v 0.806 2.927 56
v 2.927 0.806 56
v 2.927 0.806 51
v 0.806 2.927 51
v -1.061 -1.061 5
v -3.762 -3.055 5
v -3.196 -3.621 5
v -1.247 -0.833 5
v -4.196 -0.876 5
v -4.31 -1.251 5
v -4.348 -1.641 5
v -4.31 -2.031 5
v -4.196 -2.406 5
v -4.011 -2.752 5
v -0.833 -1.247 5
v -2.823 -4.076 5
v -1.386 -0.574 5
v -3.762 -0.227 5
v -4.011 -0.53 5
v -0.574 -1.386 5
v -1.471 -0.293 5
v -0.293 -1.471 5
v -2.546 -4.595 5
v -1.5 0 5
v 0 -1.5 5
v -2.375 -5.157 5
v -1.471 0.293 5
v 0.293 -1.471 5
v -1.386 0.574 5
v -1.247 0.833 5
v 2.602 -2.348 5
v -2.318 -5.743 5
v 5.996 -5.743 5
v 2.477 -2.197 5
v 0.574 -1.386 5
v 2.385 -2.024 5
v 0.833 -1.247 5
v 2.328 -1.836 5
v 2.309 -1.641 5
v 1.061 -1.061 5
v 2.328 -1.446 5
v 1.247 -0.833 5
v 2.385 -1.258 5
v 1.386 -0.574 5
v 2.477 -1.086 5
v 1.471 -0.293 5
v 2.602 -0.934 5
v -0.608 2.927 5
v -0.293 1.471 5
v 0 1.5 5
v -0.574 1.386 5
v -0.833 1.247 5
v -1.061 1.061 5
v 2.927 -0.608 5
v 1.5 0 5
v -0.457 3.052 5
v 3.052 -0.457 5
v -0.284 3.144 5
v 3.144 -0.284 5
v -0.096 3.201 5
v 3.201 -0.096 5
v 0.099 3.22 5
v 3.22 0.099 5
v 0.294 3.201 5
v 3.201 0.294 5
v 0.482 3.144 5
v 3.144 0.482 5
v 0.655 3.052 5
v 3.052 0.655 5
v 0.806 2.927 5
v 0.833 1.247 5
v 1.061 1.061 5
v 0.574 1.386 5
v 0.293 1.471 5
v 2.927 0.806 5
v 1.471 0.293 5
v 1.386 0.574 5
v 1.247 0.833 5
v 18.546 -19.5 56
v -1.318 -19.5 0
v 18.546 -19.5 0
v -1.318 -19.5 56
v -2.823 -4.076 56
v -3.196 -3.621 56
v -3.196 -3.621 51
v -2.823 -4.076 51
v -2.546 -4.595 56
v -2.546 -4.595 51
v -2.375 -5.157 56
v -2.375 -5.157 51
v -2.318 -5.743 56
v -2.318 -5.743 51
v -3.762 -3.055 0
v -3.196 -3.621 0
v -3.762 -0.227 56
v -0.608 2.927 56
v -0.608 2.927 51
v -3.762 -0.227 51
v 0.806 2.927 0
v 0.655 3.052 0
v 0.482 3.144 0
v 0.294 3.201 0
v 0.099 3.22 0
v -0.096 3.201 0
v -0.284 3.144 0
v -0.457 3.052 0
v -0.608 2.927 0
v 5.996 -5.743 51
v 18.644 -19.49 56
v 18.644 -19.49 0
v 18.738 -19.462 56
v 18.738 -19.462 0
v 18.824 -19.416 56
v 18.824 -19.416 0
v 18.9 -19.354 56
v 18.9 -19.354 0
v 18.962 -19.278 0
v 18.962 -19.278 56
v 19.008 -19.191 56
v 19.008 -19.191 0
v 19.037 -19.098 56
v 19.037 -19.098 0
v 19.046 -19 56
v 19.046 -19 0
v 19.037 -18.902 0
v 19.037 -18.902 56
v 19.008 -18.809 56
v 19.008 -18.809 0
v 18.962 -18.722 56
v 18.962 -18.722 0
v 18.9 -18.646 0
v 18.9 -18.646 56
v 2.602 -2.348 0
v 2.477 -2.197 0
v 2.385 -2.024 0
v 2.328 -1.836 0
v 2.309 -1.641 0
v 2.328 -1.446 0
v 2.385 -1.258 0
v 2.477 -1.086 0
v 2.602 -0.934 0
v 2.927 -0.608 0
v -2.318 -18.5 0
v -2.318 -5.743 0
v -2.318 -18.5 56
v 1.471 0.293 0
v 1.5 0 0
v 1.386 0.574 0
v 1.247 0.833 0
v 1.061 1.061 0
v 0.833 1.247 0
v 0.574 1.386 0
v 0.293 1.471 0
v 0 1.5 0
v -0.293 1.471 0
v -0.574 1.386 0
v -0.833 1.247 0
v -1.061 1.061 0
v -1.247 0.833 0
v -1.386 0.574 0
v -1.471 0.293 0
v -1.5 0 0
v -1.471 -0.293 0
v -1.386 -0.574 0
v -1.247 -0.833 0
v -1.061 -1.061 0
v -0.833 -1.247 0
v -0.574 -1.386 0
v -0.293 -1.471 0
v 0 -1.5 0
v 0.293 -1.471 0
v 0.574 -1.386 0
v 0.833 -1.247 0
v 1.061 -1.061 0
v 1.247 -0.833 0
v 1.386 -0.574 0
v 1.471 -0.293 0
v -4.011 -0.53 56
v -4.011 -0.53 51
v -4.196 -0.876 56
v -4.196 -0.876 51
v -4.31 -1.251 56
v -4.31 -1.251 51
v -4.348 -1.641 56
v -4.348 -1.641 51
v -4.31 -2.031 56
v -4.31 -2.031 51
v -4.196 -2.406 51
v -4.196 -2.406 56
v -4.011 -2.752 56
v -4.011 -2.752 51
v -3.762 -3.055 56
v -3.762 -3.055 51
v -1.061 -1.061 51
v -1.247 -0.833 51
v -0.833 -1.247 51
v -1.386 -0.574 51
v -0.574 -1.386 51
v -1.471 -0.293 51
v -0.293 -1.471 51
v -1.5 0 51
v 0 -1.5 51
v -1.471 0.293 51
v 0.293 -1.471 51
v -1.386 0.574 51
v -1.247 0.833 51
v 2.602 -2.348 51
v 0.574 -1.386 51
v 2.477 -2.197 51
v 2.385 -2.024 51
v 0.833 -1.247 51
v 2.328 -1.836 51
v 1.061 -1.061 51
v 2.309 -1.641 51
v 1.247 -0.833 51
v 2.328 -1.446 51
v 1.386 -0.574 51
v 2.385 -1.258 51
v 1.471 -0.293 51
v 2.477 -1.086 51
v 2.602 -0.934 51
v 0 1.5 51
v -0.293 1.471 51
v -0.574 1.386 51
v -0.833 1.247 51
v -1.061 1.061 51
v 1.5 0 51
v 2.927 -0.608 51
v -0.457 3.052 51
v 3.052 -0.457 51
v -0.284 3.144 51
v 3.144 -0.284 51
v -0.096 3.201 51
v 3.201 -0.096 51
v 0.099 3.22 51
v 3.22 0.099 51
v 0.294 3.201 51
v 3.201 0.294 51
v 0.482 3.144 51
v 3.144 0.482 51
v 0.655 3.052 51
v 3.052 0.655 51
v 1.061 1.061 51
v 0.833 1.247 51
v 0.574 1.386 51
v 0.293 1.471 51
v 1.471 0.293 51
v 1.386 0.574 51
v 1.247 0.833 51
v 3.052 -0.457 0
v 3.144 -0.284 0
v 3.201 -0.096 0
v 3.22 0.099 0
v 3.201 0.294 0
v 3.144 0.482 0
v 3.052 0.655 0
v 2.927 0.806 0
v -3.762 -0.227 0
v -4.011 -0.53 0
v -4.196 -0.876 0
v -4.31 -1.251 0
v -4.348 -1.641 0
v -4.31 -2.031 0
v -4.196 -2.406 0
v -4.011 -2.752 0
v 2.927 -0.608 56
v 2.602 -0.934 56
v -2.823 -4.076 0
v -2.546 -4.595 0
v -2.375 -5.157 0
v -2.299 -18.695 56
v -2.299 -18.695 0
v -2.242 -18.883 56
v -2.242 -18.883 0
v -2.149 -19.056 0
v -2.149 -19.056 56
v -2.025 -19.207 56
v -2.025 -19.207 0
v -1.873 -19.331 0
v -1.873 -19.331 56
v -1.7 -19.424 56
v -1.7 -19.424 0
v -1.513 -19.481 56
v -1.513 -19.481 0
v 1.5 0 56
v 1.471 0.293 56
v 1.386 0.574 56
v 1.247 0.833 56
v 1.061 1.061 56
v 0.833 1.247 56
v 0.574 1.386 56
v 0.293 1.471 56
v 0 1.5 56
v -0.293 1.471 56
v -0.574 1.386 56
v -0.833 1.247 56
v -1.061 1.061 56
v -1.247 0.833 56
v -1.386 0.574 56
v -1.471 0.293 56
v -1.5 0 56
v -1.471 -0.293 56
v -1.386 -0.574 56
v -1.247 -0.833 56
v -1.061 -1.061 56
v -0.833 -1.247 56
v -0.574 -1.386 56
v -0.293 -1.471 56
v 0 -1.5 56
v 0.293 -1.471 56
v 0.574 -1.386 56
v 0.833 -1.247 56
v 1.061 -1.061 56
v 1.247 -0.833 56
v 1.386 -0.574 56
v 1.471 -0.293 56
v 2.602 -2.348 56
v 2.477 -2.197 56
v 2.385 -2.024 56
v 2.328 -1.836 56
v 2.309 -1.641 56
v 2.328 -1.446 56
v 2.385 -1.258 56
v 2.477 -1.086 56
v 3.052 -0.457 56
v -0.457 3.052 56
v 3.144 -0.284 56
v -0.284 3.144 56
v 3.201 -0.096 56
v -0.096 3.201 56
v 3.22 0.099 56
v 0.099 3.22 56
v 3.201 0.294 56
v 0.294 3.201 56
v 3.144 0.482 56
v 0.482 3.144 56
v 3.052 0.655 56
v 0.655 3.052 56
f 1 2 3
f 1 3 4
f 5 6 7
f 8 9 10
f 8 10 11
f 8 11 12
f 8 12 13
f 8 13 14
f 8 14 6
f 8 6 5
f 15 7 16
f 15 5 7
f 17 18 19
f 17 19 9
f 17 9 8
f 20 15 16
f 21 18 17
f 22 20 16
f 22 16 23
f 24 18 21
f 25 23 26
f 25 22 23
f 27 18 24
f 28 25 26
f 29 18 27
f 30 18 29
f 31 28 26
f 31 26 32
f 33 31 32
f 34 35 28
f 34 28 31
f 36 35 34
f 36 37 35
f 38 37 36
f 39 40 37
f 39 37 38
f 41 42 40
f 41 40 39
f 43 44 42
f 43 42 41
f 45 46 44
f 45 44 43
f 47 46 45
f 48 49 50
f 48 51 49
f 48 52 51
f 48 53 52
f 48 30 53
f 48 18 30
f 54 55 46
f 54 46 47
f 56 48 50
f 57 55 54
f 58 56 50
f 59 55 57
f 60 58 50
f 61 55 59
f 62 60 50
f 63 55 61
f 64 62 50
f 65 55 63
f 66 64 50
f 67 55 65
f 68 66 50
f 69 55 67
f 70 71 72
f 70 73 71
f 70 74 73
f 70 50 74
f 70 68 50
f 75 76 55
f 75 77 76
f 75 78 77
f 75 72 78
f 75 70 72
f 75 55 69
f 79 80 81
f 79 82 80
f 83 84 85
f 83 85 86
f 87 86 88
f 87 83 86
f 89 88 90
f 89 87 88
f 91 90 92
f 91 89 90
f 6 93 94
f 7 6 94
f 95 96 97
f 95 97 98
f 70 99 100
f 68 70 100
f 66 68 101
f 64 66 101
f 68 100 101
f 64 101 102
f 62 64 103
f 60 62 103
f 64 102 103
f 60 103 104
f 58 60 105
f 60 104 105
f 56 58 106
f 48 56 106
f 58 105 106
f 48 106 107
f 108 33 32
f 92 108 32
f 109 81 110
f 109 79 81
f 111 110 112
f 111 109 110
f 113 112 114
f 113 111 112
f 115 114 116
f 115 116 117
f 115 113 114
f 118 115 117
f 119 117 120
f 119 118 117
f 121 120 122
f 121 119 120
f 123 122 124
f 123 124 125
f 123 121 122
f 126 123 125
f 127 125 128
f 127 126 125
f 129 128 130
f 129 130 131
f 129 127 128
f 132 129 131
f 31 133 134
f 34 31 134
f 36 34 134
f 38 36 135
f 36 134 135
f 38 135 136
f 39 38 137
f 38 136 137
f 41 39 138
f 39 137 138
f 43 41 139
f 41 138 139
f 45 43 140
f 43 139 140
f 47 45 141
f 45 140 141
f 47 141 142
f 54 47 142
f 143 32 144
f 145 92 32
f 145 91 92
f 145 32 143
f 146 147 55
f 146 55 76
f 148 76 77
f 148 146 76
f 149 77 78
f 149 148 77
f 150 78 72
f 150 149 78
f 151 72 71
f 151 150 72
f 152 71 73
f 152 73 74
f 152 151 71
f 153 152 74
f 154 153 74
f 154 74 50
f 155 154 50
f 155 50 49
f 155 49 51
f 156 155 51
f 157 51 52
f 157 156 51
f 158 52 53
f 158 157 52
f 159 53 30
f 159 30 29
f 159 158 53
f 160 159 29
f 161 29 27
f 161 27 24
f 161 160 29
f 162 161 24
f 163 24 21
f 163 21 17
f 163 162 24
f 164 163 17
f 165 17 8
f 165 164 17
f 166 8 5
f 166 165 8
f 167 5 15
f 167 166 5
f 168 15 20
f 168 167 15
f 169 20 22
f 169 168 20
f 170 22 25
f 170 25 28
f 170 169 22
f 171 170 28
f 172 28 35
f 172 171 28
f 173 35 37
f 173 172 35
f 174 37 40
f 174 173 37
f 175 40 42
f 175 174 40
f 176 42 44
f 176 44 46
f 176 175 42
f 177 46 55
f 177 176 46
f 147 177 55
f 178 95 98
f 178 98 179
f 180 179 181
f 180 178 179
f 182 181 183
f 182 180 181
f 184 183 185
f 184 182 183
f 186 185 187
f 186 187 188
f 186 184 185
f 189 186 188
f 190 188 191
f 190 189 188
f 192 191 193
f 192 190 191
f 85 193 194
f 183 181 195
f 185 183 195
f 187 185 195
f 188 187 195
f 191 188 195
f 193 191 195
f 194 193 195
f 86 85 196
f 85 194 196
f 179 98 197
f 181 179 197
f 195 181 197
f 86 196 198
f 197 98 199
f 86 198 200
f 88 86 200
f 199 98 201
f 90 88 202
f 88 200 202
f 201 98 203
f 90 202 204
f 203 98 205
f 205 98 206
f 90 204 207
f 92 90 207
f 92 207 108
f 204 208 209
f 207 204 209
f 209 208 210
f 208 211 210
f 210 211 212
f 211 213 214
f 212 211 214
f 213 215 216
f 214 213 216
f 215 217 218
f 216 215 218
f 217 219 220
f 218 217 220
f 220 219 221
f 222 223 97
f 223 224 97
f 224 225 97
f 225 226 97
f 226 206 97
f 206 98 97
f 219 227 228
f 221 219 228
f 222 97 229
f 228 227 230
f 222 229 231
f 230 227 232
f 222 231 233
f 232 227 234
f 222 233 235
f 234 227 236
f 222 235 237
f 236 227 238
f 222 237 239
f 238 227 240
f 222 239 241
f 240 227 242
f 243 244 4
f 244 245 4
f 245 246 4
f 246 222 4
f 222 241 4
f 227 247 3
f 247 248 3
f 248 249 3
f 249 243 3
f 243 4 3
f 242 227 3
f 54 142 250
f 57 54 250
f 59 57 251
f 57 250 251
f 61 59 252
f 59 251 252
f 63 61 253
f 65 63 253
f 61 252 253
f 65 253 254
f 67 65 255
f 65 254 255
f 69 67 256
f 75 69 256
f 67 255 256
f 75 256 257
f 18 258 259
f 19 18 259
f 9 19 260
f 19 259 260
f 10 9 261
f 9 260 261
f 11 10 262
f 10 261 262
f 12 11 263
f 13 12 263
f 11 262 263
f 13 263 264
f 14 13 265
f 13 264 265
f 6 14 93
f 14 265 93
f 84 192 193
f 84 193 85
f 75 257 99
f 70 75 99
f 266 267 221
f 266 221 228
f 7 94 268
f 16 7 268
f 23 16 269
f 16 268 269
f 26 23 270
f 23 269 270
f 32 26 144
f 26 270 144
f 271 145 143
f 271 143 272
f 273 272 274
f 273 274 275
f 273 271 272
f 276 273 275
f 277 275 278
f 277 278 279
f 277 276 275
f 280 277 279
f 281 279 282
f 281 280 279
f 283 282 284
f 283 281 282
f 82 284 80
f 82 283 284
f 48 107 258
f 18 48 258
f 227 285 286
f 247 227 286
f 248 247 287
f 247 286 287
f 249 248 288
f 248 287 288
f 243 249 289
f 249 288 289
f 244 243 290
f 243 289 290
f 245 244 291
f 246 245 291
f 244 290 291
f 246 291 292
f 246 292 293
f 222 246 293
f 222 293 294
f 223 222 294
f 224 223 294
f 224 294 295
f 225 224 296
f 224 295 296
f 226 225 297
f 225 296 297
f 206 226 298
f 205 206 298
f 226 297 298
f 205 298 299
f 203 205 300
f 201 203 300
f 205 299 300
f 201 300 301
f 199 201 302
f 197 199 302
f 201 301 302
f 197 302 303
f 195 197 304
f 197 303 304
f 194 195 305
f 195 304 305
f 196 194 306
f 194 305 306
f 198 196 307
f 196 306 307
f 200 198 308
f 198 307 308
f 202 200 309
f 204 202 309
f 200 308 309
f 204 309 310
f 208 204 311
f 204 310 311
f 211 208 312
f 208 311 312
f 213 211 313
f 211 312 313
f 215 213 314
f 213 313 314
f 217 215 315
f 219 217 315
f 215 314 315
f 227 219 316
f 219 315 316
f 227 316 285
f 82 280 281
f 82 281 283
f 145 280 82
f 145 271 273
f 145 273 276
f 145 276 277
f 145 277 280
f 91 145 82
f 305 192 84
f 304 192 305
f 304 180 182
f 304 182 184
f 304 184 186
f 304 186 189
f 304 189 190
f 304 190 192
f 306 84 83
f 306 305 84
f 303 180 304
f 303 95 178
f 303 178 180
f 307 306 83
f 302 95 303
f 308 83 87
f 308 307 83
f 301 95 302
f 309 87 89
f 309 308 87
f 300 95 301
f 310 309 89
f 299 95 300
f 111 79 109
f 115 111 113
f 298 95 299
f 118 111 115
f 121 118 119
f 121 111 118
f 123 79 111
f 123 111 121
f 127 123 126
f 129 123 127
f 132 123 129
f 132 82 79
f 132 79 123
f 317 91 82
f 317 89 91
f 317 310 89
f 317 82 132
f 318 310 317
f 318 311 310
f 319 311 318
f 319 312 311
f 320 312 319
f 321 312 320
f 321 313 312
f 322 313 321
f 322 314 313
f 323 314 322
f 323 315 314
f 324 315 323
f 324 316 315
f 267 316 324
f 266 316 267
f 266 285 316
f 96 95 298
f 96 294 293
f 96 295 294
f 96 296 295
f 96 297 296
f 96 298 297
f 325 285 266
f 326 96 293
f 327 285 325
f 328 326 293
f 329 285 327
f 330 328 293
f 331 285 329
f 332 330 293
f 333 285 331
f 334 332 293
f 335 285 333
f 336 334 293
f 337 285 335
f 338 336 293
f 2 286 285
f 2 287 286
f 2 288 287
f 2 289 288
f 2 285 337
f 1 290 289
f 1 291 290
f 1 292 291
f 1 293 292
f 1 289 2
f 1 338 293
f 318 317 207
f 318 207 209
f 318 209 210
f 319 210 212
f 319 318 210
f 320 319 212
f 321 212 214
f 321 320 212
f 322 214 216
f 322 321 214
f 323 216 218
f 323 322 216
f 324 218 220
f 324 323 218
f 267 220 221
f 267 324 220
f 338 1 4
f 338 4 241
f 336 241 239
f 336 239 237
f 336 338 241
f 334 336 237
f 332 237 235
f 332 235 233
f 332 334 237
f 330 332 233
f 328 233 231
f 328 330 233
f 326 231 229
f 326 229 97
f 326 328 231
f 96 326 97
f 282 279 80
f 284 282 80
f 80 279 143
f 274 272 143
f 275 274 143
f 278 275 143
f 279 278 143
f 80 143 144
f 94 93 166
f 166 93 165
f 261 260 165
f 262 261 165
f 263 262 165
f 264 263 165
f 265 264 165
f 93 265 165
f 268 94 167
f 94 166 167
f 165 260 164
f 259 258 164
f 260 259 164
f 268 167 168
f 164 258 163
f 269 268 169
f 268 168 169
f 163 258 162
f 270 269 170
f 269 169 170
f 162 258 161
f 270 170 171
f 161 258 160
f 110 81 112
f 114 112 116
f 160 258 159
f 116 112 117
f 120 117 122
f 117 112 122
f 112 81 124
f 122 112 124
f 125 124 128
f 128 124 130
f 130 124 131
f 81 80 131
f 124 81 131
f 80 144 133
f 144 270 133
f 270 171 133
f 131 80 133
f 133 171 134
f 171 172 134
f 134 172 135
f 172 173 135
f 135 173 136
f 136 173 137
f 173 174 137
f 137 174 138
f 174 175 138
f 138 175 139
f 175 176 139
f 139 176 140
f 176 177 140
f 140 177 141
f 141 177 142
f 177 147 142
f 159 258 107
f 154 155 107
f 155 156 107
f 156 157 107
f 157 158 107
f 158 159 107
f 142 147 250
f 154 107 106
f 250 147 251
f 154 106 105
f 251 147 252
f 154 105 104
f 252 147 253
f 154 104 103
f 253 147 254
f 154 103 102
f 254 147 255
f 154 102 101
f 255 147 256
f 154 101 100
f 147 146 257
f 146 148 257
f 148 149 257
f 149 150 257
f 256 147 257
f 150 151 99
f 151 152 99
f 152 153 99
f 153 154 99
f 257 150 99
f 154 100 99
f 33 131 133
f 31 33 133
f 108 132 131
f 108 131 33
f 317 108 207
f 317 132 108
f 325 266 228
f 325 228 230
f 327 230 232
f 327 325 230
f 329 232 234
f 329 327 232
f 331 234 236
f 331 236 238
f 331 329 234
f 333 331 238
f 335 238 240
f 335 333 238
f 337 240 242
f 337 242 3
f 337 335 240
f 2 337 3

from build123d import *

# Parameters (mm, degrees)
SKETCH1_R           = 1.5
BOSS_EXTRUDE1_DEPTH = 5
BOSS_EXTRUDE2_DEPTH = 23


with BuildPart() as part:
    # Sketch1 → Boss-Extrude1 (new body)
    with BuildSketch(Plane.XY):
        with BuildLine():
            Line((-3.762452186, -3.055345405), (-3.196477247, -3.621320344))
            ThreePointArc((-3.196477247, -3.621320344), (-2.546158993, -4.59459039), (-2.31779759, -5.742640687))
            Line((-2.31779759, -5.742640687), (-2.31779759, -18.5))
            ThreePointArc((-2.31779759, -18.5), (-2.024904371, -19.207106781), (-1.31779759, -19.5))
            Line((-1.31779759, -19.5), (18.54616344, -19.5))
            ThreePointArc((18.54616344, -19.5), (19.008103207, -19.191341716), (18.899716831, -18.646446609))
            Line((18.899716831, -18.646446609), (2.601508845, -2.348238623))
            ThreePointArc((2.601508845, -2.348238623), (2.308615626, -1.641131842), (2.601508845, -0.934025061))
            Line((2.601508845, -0.934025061), (2.927422074, -0.608111832))
            ThreePointArc((2.927422074, -0.608111832), (3.220315293, 0.098994949), (2.927422074, 0.806101731))
            Line((2.927422074, 0.806101731), (0.806101731, 2.927422074))
            ThreePointArc((0.806101731, 2.927422074), (0.098994949, 3.220315293), (-0.608111832, 2.927422074))
            Line((-0.608111832, 2.927422074), (-1.641131842, 1.894402064))
            Line((-1.641131842, 1.894402064), (-3.762452186, -0.22691828))
            ThreePointArc((-3.762452186, -0.22691828), (-4.348238623, -1.641131842), (-3.762452186, -3.055345405))
        make_face()
        Circle(SKETCH1_R, mode=Mode.SUBTRACT)
    boss_extrude1 = extrude(amount=BOSS_EXTRUDE1_DEPTH)

    # Sketch2 → Boss-Extrude2 (add)
    with BuildSketch(Plane.XY.offset(5)):
        with BuildLine():
            Line((18.899716831, -18.646446609), (5.995910909, -5.742640687))
            Line((5.995910909, -5.742640687), (-2.31779759, -5.742640687))
            Line((-2.31779759, -5.742640687), (-2.31779759, -18.5))
            ThreePointArc((-2.31779759, -18.5), (-2.024904371, -19.207106781), (-1.31779759, -19.5))
            Line((-1.31779759, -19.5), (18.54616344, -19.5))
            ThreePointArc((18.54616344, -19.5), (19.008103207, -19.191341716), (18.899716831, -18.646446609))
        make_face()
    boss_extrude2 = extrude(amount=BOSS_EXTRUDE2_DEPTH)

    # Mirror1: Boss-Extrude1, Boss-Extrude2 across plane
    add(boss_extrude1.mirror(Plane.XY.offset(28)))
    add(boss_extrude2.mirror(Plane.XY.offset(28)))


solid = part.part
